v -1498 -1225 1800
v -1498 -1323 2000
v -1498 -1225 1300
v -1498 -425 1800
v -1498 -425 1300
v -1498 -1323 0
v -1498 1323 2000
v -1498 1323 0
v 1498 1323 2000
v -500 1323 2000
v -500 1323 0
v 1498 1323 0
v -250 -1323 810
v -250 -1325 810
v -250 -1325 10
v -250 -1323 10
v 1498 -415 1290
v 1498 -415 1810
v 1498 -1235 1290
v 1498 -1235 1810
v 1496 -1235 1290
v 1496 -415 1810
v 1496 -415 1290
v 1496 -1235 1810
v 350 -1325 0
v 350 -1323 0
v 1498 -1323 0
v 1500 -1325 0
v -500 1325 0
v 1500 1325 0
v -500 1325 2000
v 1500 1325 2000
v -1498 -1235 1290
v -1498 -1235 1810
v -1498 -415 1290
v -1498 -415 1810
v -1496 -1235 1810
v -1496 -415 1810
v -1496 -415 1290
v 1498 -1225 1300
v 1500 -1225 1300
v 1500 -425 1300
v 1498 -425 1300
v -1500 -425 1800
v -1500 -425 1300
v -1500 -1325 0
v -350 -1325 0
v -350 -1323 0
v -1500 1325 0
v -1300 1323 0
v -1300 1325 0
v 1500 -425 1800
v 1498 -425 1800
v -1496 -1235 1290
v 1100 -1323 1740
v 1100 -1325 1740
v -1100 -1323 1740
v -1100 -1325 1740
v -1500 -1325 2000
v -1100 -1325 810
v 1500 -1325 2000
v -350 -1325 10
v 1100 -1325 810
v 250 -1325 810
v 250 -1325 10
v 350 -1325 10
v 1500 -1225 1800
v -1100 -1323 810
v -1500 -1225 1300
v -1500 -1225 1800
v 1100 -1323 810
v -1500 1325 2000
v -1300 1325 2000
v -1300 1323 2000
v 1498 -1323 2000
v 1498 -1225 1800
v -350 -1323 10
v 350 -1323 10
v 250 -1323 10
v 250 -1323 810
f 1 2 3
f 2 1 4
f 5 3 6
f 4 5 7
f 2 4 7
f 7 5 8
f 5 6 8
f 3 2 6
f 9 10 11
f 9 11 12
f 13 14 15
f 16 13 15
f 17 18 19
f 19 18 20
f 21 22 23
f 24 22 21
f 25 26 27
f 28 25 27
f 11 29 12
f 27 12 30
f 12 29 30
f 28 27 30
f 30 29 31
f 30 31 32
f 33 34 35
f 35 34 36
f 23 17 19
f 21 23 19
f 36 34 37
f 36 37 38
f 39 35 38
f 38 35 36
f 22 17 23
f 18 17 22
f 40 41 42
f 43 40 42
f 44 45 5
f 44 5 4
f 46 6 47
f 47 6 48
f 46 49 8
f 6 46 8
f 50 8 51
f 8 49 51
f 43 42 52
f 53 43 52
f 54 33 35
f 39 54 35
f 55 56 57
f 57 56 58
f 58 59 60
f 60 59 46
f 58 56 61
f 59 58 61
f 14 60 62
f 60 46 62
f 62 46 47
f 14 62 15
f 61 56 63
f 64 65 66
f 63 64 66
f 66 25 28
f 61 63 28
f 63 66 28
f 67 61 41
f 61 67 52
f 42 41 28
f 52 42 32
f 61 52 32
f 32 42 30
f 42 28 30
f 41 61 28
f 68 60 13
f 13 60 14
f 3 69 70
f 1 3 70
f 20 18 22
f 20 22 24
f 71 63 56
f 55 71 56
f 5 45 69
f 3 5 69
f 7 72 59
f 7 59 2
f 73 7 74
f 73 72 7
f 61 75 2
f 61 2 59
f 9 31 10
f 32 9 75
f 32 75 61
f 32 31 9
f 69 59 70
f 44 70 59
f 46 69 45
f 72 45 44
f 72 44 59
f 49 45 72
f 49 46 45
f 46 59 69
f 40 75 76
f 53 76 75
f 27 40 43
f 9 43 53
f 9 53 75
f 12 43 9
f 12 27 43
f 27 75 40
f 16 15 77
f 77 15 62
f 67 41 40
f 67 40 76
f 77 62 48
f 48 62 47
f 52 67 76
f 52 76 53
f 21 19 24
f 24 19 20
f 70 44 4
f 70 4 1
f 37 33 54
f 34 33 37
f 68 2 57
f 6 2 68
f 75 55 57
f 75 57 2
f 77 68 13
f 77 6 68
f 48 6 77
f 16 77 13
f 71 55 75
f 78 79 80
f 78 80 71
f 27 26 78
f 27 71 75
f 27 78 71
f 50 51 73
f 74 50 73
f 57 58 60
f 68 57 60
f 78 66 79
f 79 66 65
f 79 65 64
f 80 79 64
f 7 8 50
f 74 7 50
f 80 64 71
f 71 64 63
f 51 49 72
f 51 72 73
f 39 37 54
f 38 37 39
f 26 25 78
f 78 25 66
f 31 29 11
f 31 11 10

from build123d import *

# Parameters (mm, degrees)
F0_W      = 3000
F0_H      = 2650
F0_W_2    = 2996
F0_H_2    = 2646
F1_DEPTH  = 2000
F3_DEPTH  = 2
F4_W      = 800
F4_H      = 500
F6_DEPTH  = 2
F5_W      = 800
F5_H      = 500
F7_DEPTH  = 2
F8_W      = 820
F8_H      = 520
F9_DEPTH  = 2
F10_W     = 820
F10_H     = 520
F11_DEPTH = 2
F12_W     = 800
F12_H     = 2000
F13_DEPTH = 2


with BuildPart() as f1:
    # F0 (on Top) → F1 (new body)
    with BuildSketch(Plane.XY):
        Rectangle(F0_W, F0_H)
        Rectangle(F0_W_2, F0_H_2, mode=Mode.SUBTRACT)
    extrude(amount=F1_DEPTH)

    # F2 (on face) → F3 (cut)
    with BuildSketch(Plane.XZ.offset(1325)):
        Polygon((1100, 1740), (0, 1740), (-1100, 1740), (-1100, 810), (-350, 810), (-250, 810), (-250, 10), (-350, 10), (-350, 0), (0, 0), (350, 0), (350, 10), (250, 10), (250, 810), (1100, 810), align=None)
    extrude(amount=-F3_DEPTH, mode=Mode.SUBTRACT)

    # F4 (on face) → F6 (cut)
    with BuildSketch(Plane(origin=(-1500, 0, 0), x_dir=(0, -1, 0), z_dir=(-1, 0, 0))):
        with Locations((825, 1550)):
            Rectangle(F4_W, F4_H)
    extrude(amount=-F6_DEPTH, mode=Mode.SUBTRACT)

    # F5 (on face) → F7 (cut)
    with BuildSketch(Plane.YZ.offset(1500)):
        with Locations((-825, 1550)):
            Rectangle(F5_W, F5_H)
    extrude(amount=-F7_DEPTH, mode=Mode.SUBTRACT)

    # F12 (on face) → F13 (cut)
    with BuildSketch(Plane(origin=(0, 1325, 0), x_dir=(-1, 0, 0), z_dir=(0, 1, 0))):
        with Locations((900, 1000)):
            Rectangle(F12_W, F12_H)
    extrude(amount=-F13_DEPTH, mode=Mode.SUBTRACT)


with BuildPart() as f9:
    # F8 (on face) → F9 (new body)
    with BuildSketch(Plane(origin=(1498, 0, 0), x_dir=(0, -1, 0), z_dir=(-1, 0, 0))):
        with Locations((825, 1550)):
            Rectangle(F8_W, F8_H)
    extrude(amount=F9_DEPTH)


with BuildPart() as f11:
    # F10 (on face) → F11 (new body)
    with BuildSketch(Plane.YZ.offset(-1498)):
        with Locations((-825, 1550)):
            Rectangle(F10_W, F10_H)
    extrude(amount=F11_DEPTH)


solid = Compound([f1.part, f9.part, f11.part])
